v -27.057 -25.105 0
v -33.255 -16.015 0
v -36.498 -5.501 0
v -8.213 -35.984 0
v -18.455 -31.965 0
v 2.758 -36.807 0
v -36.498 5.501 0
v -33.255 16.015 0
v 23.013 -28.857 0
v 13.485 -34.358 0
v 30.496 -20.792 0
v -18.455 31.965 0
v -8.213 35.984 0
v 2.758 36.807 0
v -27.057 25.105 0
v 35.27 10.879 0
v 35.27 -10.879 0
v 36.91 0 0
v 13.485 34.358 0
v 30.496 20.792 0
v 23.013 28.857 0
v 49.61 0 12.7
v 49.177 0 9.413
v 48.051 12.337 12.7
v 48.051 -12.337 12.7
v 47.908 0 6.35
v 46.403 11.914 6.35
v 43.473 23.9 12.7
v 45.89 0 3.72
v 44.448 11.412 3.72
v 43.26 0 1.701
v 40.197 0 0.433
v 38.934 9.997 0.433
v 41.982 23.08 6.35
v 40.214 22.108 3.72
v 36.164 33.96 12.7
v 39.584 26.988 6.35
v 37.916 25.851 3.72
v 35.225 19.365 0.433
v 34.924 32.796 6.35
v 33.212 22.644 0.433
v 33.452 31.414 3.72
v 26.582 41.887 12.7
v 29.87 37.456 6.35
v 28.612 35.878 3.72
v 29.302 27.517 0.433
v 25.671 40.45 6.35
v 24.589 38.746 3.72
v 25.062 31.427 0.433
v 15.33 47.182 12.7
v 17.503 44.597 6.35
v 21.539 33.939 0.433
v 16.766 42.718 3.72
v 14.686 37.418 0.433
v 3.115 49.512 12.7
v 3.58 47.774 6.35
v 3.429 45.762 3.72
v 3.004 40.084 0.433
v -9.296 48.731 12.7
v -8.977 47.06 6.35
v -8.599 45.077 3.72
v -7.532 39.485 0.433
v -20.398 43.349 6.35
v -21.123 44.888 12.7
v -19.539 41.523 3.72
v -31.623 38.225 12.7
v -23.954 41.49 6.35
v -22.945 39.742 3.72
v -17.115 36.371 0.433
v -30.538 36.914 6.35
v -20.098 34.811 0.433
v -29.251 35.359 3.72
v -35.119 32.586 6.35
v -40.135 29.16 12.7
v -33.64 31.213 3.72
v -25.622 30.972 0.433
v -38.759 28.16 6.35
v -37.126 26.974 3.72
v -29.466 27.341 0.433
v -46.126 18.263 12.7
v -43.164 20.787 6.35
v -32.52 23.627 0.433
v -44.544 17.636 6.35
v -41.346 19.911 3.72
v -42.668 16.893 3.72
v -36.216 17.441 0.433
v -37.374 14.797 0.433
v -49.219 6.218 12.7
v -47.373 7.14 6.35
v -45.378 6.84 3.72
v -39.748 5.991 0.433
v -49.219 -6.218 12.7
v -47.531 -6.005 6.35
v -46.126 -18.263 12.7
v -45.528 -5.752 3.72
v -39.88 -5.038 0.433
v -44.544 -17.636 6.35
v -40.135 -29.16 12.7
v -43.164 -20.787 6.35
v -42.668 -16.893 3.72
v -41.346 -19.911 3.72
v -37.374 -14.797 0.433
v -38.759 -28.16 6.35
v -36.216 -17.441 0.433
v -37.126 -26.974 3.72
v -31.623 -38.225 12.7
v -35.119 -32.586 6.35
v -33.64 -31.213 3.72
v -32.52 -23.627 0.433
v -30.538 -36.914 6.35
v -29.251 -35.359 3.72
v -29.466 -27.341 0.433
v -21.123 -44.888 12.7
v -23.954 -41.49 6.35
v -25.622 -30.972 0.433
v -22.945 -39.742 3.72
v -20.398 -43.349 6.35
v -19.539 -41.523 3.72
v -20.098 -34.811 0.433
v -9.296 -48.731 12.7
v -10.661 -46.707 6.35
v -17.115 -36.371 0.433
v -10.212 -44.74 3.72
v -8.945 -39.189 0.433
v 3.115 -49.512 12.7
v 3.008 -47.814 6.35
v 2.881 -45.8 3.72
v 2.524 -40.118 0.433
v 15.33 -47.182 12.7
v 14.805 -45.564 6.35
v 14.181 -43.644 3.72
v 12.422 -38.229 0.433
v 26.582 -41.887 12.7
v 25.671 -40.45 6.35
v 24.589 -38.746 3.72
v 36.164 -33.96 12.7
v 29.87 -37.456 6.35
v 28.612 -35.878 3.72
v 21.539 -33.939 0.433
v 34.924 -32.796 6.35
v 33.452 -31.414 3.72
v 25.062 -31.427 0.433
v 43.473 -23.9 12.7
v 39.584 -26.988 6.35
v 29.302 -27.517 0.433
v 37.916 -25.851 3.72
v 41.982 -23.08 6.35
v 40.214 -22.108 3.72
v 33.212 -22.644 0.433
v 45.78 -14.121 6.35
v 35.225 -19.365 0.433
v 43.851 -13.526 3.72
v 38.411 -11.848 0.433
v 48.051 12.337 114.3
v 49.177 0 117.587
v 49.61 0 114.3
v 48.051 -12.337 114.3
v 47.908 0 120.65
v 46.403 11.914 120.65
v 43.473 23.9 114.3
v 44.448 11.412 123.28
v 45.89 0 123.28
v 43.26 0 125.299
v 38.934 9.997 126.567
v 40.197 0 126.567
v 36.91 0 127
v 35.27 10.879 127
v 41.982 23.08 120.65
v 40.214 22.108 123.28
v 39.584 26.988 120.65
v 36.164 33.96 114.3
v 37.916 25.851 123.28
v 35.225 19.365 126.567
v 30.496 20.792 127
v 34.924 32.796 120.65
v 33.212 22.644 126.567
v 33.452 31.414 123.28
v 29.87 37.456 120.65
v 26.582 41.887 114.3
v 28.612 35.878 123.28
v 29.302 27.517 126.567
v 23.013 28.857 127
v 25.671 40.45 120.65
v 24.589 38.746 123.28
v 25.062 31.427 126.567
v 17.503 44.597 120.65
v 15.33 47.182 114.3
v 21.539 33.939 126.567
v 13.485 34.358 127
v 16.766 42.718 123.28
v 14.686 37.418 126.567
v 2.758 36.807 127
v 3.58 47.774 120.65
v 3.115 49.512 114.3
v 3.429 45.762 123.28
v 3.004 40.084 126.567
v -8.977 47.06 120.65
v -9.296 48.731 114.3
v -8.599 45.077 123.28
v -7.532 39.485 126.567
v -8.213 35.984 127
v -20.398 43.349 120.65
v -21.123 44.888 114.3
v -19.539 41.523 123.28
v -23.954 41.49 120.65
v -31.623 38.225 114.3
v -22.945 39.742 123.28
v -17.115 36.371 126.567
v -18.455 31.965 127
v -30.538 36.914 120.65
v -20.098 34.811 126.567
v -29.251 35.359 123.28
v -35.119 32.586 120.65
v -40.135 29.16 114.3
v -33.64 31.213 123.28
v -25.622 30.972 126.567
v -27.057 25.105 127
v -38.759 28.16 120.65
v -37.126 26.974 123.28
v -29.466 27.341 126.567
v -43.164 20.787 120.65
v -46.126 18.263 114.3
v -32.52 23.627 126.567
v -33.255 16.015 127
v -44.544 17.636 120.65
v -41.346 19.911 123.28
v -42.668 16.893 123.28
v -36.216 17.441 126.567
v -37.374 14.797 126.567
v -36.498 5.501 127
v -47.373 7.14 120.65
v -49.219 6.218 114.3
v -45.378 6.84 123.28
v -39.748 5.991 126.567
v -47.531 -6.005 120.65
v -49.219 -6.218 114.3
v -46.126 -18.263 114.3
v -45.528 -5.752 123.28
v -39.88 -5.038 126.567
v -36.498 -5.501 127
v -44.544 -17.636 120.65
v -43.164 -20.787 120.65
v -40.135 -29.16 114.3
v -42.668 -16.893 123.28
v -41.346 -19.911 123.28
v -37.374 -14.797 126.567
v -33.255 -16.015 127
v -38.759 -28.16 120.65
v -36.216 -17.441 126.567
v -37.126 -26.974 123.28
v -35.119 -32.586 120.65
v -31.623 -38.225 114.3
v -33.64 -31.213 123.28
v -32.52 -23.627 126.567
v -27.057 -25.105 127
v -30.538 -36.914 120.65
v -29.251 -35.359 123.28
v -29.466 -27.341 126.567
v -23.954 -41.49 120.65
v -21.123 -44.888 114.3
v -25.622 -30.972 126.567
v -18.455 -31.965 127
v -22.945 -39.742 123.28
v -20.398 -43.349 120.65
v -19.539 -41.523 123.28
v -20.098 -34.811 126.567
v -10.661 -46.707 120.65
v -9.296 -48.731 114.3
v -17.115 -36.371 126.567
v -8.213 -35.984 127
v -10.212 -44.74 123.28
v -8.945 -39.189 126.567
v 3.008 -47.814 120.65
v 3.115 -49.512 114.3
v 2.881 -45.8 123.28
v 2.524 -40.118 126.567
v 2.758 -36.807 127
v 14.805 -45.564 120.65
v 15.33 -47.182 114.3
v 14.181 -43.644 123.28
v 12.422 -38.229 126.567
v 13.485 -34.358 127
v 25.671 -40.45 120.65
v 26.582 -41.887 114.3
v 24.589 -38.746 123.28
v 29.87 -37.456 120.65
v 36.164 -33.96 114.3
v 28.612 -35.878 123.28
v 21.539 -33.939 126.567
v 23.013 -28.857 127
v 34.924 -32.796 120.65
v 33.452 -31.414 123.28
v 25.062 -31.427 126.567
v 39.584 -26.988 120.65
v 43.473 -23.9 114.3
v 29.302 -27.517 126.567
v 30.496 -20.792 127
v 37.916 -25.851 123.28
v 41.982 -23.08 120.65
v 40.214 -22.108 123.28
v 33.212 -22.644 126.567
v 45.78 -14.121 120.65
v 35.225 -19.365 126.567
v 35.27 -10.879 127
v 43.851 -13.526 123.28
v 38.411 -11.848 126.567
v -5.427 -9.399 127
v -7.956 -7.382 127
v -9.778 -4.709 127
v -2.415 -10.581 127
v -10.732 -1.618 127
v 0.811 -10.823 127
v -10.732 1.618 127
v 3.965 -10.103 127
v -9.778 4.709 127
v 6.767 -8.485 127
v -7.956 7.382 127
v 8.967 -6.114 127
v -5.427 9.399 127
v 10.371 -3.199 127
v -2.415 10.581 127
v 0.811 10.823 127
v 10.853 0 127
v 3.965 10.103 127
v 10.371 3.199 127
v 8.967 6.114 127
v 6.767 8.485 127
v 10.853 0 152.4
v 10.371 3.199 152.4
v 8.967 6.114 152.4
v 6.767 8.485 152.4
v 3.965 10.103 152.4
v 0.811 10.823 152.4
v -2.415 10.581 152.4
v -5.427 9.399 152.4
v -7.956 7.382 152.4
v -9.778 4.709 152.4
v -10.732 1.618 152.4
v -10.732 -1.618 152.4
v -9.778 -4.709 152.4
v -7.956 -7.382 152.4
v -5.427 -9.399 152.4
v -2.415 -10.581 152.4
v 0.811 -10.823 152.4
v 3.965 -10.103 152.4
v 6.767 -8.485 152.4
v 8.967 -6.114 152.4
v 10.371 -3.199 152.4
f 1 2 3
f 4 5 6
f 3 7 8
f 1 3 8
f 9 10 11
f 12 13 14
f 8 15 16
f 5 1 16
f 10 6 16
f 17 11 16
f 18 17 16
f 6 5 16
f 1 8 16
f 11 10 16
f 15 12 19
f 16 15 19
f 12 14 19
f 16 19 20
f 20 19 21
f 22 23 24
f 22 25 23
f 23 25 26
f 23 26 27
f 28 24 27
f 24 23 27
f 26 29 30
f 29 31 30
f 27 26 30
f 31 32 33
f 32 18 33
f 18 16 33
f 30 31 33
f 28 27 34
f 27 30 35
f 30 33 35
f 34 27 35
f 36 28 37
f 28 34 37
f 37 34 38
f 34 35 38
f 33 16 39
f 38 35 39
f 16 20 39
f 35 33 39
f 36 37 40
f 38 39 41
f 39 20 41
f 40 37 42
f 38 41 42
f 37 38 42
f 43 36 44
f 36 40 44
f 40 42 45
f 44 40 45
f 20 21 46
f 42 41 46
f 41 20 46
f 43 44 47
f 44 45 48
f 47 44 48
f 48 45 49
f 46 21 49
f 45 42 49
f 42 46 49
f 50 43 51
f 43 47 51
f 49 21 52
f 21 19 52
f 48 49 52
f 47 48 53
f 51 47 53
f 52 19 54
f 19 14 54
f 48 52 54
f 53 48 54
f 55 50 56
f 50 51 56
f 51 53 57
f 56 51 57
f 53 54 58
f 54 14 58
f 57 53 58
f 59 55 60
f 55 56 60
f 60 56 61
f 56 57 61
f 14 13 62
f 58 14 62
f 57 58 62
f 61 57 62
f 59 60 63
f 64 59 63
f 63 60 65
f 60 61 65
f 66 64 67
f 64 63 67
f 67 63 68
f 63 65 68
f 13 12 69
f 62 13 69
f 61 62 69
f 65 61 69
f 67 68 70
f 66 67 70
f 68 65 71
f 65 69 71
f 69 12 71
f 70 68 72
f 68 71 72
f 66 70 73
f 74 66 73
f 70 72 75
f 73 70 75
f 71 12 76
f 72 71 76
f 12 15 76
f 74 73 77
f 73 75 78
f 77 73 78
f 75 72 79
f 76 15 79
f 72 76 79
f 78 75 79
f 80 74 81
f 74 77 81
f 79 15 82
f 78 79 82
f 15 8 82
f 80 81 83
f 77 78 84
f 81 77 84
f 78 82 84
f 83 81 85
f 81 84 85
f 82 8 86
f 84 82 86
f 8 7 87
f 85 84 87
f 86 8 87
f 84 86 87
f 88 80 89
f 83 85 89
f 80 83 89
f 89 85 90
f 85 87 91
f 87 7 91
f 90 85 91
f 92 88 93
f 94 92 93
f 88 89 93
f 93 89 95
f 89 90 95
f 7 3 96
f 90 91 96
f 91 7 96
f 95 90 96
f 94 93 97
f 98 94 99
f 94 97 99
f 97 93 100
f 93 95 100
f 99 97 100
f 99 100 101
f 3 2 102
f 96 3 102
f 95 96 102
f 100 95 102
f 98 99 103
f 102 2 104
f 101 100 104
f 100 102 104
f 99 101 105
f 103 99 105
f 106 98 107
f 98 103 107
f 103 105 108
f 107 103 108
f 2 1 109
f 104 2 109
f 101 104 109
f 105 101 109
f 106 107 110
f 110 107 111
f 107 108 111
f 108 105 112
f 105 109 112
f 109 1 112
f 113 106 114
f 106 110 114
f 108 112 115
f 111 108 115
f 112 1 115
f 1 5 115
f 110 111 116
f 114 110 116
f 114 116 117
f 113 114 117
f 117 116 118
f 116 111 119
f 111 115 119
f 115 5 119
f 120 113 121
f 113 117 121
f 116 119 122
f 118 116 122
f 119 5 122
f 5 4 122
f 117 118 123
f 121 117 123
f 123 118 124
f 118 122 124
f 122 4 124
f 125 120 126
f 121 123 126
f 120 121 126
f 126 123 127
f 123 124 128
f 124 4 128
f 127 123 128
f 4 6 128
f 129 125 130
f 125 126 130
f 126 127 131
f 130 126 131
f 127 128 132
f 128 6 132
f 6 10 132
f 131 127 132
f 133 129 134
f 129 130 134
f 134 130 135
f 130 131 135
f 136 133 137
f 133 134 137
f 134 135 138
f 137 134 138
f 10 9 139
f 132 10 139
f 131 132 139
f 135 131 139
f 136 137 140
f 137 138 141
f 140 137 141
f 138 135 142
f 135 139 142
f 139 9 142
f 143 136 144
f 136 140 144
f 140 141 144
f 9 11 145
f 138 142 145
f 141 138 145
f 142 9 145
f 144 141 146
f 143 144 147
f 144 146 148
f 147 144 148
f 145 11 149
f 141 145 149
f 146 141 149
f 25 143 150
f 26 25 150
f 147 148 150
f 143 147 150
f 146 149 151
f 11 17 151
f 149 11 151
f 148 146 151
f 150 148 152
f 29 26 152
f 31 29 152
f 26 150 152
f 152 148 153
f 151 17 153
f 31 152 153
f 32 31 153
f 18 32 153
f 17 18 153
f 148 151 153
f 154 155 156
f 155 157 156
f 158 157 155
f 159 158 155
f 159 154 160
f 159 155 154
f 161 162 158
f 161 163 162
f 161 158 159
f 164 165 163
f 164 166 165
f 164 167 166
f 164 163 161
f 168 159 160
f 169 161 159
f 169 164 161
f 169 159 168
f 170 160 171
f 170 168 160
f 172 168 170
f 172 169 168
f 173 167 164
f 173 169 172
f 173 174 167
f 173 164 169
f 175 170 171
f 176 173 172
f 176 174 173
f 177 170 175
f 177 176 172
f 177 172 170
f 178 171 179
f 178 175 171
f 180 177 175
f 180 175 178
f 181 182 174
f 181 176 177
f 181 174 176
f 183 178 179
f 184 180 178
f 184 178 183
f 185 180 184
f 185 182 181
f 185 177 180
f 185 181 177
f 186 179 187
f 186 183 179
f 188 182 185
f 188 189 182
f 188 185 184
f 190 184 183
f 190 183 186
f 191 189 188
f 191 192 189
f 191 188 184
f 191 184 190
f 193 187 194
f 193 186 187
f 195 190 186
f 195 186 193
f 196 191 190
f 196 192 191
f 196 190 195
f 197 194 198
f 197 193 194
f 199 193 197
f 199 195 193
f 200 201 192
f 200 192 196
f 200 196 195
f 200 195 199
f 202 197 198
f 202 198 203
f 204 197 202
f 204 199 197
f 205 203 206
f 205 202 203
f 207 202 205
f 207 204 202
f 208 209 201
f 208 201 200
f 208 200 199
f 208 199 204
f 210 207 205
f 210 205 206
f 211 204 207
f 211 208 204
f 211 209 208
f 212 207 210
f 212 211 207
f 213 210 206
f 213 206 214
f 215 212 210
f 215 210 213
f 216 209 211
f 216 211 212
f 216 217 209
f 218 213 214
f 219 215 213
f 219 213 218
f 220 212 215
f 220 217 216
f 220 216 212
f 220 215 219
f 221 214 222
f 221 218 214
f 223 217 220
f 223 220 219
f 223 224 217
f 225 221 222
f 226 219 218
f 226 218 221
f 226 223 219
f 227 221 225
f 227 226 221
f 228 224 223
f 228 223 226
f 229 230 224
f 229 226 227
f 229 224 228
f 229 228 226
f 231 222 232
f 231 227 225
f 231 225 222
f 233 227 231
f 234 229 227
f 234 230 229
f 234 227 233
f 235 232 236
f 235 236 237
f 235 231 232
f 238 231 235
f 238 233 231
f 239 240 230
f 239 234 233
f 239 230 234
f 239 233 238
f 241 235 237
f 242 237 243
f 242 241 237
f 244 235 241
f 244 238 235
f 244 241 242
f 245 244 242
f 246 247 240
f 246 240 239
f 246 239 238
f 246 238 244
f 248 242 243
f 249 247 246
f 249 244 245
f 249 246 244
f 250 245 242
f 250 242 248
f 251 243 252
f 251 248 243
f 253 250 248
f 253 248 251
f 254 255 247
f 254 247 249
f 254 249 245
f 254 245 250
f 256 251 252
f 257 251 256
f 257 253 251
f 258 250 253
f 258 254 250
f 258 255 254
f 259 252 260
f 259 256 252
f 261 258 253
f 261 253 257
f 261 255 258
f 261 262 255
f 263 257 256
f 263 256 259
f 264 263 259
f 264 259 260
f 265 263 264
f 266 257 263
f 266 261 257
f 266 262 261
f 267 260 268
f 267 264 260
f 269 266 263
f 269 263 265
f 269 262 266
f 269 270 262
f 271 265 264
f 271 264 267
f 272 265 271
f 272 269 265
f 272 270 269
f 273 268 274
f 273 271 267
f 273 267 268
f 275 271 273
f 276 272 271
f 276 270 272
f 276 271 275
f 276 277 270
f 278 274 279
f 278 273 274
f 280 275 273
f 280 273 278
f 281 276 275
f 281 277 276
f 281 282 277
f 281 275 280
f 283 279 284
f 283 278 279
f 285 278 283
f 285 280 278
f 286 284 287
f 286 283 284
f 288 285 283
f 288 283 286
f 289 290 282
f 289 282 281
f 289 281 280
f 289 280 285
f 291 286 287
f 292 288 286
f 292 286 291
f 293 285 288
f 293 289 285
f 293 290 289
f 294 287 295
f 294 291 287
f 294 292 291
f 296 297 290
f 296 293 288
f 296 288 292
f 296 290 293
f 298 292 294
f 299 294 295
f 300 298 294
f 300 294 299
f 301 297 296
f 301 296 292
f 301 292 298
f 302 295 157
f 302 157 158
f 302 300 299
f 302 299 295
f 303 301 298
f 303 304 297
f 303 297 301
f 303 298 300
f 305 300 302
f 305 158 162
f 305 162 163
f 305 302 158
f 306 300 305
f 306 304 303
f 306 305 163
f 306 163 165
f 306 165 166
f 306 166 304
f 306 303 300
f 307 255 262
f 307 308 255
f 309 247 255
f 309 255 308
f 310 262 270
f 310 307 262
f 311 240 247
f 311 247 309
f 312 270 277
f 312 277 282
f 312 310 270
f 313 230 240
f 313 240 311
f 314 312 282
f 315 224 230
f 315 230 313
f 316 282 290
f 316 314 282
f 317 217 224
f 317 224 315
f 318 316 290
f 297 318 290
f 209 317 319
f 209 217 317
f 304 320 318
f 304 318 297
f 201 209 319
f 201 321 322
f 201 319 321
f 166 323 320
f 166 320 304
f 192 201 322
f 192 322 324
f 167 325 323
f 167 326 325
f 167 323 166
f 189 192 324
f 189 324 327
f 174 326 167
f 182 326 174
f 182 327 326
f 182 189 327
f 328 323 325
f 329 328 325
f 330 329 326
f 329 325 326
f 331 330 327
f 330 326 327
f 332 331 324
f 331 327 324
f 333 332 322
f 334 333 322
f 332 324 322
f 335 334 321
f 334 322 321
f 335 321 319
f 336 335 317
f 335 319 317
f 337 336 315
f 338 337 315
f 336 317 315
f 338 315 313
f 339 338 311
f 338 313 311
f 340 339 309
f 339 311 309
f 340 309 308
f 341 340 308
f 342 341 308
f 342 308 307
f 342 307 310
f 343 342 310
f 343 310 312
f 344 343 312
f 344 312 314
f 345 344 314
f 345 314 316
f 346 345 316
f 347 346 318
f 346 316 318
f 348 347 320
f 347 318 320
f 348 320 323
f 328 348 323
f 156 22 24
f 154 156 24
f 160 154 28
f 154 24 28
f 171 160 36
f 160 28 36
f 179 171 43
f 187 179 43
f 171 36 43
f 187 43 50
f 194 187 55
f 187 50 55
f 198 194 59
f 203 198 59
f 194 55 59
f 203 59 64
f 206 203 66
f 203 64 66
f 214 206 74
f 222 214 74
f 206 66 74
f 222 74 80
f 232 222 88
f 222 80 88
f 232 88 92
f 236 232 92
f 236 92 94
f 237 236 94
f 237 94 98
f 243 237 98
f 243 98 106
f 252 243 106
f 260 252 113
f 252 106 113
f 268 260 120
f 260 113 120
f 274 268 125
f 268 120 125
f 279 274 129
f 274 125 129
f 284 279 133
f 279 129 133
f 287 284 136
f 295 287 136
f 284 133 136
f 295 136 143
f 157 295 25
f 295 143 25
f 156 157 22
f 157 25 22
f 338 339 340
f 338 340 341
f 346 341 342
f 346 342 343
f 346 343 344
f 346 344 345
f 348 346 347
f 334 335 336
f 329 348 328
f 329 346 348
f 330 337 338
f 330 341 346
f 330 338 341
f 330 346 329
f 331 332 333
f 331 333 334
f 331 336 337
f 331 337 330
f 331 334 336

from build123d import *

# Parameters (mm, degrees)
F0_R     = 49.609853
F1_DEPTH = 127
F2_R     = 10.853021
F3_DEPTH = 25.4
F4_R     = 12.7


with BuildPart() as f1:
    # F0 (on Top) → F1 (new body)
    with BuildSketch(Plane.XY):
        Circle(F0_R)
    extrude(amount=F1_DEPTH)

    # F2 (on face) → F3 (join)
    with BuildSketch(Plane.XY.offset(127)):
        Circle(F2_R)
    extrude(amount=F3_DEPTH)

    # F4
    f4_edges = [f1.edges().sort_by_distance(p)[0] for p in [
        (-49.609853, 0, 127),
        (49.609853, 0, 63.5),
        (-49.609853, 0, 0),
    ]]
    fillet(f4_edges, radius=F4_R)


solid = f1.part
